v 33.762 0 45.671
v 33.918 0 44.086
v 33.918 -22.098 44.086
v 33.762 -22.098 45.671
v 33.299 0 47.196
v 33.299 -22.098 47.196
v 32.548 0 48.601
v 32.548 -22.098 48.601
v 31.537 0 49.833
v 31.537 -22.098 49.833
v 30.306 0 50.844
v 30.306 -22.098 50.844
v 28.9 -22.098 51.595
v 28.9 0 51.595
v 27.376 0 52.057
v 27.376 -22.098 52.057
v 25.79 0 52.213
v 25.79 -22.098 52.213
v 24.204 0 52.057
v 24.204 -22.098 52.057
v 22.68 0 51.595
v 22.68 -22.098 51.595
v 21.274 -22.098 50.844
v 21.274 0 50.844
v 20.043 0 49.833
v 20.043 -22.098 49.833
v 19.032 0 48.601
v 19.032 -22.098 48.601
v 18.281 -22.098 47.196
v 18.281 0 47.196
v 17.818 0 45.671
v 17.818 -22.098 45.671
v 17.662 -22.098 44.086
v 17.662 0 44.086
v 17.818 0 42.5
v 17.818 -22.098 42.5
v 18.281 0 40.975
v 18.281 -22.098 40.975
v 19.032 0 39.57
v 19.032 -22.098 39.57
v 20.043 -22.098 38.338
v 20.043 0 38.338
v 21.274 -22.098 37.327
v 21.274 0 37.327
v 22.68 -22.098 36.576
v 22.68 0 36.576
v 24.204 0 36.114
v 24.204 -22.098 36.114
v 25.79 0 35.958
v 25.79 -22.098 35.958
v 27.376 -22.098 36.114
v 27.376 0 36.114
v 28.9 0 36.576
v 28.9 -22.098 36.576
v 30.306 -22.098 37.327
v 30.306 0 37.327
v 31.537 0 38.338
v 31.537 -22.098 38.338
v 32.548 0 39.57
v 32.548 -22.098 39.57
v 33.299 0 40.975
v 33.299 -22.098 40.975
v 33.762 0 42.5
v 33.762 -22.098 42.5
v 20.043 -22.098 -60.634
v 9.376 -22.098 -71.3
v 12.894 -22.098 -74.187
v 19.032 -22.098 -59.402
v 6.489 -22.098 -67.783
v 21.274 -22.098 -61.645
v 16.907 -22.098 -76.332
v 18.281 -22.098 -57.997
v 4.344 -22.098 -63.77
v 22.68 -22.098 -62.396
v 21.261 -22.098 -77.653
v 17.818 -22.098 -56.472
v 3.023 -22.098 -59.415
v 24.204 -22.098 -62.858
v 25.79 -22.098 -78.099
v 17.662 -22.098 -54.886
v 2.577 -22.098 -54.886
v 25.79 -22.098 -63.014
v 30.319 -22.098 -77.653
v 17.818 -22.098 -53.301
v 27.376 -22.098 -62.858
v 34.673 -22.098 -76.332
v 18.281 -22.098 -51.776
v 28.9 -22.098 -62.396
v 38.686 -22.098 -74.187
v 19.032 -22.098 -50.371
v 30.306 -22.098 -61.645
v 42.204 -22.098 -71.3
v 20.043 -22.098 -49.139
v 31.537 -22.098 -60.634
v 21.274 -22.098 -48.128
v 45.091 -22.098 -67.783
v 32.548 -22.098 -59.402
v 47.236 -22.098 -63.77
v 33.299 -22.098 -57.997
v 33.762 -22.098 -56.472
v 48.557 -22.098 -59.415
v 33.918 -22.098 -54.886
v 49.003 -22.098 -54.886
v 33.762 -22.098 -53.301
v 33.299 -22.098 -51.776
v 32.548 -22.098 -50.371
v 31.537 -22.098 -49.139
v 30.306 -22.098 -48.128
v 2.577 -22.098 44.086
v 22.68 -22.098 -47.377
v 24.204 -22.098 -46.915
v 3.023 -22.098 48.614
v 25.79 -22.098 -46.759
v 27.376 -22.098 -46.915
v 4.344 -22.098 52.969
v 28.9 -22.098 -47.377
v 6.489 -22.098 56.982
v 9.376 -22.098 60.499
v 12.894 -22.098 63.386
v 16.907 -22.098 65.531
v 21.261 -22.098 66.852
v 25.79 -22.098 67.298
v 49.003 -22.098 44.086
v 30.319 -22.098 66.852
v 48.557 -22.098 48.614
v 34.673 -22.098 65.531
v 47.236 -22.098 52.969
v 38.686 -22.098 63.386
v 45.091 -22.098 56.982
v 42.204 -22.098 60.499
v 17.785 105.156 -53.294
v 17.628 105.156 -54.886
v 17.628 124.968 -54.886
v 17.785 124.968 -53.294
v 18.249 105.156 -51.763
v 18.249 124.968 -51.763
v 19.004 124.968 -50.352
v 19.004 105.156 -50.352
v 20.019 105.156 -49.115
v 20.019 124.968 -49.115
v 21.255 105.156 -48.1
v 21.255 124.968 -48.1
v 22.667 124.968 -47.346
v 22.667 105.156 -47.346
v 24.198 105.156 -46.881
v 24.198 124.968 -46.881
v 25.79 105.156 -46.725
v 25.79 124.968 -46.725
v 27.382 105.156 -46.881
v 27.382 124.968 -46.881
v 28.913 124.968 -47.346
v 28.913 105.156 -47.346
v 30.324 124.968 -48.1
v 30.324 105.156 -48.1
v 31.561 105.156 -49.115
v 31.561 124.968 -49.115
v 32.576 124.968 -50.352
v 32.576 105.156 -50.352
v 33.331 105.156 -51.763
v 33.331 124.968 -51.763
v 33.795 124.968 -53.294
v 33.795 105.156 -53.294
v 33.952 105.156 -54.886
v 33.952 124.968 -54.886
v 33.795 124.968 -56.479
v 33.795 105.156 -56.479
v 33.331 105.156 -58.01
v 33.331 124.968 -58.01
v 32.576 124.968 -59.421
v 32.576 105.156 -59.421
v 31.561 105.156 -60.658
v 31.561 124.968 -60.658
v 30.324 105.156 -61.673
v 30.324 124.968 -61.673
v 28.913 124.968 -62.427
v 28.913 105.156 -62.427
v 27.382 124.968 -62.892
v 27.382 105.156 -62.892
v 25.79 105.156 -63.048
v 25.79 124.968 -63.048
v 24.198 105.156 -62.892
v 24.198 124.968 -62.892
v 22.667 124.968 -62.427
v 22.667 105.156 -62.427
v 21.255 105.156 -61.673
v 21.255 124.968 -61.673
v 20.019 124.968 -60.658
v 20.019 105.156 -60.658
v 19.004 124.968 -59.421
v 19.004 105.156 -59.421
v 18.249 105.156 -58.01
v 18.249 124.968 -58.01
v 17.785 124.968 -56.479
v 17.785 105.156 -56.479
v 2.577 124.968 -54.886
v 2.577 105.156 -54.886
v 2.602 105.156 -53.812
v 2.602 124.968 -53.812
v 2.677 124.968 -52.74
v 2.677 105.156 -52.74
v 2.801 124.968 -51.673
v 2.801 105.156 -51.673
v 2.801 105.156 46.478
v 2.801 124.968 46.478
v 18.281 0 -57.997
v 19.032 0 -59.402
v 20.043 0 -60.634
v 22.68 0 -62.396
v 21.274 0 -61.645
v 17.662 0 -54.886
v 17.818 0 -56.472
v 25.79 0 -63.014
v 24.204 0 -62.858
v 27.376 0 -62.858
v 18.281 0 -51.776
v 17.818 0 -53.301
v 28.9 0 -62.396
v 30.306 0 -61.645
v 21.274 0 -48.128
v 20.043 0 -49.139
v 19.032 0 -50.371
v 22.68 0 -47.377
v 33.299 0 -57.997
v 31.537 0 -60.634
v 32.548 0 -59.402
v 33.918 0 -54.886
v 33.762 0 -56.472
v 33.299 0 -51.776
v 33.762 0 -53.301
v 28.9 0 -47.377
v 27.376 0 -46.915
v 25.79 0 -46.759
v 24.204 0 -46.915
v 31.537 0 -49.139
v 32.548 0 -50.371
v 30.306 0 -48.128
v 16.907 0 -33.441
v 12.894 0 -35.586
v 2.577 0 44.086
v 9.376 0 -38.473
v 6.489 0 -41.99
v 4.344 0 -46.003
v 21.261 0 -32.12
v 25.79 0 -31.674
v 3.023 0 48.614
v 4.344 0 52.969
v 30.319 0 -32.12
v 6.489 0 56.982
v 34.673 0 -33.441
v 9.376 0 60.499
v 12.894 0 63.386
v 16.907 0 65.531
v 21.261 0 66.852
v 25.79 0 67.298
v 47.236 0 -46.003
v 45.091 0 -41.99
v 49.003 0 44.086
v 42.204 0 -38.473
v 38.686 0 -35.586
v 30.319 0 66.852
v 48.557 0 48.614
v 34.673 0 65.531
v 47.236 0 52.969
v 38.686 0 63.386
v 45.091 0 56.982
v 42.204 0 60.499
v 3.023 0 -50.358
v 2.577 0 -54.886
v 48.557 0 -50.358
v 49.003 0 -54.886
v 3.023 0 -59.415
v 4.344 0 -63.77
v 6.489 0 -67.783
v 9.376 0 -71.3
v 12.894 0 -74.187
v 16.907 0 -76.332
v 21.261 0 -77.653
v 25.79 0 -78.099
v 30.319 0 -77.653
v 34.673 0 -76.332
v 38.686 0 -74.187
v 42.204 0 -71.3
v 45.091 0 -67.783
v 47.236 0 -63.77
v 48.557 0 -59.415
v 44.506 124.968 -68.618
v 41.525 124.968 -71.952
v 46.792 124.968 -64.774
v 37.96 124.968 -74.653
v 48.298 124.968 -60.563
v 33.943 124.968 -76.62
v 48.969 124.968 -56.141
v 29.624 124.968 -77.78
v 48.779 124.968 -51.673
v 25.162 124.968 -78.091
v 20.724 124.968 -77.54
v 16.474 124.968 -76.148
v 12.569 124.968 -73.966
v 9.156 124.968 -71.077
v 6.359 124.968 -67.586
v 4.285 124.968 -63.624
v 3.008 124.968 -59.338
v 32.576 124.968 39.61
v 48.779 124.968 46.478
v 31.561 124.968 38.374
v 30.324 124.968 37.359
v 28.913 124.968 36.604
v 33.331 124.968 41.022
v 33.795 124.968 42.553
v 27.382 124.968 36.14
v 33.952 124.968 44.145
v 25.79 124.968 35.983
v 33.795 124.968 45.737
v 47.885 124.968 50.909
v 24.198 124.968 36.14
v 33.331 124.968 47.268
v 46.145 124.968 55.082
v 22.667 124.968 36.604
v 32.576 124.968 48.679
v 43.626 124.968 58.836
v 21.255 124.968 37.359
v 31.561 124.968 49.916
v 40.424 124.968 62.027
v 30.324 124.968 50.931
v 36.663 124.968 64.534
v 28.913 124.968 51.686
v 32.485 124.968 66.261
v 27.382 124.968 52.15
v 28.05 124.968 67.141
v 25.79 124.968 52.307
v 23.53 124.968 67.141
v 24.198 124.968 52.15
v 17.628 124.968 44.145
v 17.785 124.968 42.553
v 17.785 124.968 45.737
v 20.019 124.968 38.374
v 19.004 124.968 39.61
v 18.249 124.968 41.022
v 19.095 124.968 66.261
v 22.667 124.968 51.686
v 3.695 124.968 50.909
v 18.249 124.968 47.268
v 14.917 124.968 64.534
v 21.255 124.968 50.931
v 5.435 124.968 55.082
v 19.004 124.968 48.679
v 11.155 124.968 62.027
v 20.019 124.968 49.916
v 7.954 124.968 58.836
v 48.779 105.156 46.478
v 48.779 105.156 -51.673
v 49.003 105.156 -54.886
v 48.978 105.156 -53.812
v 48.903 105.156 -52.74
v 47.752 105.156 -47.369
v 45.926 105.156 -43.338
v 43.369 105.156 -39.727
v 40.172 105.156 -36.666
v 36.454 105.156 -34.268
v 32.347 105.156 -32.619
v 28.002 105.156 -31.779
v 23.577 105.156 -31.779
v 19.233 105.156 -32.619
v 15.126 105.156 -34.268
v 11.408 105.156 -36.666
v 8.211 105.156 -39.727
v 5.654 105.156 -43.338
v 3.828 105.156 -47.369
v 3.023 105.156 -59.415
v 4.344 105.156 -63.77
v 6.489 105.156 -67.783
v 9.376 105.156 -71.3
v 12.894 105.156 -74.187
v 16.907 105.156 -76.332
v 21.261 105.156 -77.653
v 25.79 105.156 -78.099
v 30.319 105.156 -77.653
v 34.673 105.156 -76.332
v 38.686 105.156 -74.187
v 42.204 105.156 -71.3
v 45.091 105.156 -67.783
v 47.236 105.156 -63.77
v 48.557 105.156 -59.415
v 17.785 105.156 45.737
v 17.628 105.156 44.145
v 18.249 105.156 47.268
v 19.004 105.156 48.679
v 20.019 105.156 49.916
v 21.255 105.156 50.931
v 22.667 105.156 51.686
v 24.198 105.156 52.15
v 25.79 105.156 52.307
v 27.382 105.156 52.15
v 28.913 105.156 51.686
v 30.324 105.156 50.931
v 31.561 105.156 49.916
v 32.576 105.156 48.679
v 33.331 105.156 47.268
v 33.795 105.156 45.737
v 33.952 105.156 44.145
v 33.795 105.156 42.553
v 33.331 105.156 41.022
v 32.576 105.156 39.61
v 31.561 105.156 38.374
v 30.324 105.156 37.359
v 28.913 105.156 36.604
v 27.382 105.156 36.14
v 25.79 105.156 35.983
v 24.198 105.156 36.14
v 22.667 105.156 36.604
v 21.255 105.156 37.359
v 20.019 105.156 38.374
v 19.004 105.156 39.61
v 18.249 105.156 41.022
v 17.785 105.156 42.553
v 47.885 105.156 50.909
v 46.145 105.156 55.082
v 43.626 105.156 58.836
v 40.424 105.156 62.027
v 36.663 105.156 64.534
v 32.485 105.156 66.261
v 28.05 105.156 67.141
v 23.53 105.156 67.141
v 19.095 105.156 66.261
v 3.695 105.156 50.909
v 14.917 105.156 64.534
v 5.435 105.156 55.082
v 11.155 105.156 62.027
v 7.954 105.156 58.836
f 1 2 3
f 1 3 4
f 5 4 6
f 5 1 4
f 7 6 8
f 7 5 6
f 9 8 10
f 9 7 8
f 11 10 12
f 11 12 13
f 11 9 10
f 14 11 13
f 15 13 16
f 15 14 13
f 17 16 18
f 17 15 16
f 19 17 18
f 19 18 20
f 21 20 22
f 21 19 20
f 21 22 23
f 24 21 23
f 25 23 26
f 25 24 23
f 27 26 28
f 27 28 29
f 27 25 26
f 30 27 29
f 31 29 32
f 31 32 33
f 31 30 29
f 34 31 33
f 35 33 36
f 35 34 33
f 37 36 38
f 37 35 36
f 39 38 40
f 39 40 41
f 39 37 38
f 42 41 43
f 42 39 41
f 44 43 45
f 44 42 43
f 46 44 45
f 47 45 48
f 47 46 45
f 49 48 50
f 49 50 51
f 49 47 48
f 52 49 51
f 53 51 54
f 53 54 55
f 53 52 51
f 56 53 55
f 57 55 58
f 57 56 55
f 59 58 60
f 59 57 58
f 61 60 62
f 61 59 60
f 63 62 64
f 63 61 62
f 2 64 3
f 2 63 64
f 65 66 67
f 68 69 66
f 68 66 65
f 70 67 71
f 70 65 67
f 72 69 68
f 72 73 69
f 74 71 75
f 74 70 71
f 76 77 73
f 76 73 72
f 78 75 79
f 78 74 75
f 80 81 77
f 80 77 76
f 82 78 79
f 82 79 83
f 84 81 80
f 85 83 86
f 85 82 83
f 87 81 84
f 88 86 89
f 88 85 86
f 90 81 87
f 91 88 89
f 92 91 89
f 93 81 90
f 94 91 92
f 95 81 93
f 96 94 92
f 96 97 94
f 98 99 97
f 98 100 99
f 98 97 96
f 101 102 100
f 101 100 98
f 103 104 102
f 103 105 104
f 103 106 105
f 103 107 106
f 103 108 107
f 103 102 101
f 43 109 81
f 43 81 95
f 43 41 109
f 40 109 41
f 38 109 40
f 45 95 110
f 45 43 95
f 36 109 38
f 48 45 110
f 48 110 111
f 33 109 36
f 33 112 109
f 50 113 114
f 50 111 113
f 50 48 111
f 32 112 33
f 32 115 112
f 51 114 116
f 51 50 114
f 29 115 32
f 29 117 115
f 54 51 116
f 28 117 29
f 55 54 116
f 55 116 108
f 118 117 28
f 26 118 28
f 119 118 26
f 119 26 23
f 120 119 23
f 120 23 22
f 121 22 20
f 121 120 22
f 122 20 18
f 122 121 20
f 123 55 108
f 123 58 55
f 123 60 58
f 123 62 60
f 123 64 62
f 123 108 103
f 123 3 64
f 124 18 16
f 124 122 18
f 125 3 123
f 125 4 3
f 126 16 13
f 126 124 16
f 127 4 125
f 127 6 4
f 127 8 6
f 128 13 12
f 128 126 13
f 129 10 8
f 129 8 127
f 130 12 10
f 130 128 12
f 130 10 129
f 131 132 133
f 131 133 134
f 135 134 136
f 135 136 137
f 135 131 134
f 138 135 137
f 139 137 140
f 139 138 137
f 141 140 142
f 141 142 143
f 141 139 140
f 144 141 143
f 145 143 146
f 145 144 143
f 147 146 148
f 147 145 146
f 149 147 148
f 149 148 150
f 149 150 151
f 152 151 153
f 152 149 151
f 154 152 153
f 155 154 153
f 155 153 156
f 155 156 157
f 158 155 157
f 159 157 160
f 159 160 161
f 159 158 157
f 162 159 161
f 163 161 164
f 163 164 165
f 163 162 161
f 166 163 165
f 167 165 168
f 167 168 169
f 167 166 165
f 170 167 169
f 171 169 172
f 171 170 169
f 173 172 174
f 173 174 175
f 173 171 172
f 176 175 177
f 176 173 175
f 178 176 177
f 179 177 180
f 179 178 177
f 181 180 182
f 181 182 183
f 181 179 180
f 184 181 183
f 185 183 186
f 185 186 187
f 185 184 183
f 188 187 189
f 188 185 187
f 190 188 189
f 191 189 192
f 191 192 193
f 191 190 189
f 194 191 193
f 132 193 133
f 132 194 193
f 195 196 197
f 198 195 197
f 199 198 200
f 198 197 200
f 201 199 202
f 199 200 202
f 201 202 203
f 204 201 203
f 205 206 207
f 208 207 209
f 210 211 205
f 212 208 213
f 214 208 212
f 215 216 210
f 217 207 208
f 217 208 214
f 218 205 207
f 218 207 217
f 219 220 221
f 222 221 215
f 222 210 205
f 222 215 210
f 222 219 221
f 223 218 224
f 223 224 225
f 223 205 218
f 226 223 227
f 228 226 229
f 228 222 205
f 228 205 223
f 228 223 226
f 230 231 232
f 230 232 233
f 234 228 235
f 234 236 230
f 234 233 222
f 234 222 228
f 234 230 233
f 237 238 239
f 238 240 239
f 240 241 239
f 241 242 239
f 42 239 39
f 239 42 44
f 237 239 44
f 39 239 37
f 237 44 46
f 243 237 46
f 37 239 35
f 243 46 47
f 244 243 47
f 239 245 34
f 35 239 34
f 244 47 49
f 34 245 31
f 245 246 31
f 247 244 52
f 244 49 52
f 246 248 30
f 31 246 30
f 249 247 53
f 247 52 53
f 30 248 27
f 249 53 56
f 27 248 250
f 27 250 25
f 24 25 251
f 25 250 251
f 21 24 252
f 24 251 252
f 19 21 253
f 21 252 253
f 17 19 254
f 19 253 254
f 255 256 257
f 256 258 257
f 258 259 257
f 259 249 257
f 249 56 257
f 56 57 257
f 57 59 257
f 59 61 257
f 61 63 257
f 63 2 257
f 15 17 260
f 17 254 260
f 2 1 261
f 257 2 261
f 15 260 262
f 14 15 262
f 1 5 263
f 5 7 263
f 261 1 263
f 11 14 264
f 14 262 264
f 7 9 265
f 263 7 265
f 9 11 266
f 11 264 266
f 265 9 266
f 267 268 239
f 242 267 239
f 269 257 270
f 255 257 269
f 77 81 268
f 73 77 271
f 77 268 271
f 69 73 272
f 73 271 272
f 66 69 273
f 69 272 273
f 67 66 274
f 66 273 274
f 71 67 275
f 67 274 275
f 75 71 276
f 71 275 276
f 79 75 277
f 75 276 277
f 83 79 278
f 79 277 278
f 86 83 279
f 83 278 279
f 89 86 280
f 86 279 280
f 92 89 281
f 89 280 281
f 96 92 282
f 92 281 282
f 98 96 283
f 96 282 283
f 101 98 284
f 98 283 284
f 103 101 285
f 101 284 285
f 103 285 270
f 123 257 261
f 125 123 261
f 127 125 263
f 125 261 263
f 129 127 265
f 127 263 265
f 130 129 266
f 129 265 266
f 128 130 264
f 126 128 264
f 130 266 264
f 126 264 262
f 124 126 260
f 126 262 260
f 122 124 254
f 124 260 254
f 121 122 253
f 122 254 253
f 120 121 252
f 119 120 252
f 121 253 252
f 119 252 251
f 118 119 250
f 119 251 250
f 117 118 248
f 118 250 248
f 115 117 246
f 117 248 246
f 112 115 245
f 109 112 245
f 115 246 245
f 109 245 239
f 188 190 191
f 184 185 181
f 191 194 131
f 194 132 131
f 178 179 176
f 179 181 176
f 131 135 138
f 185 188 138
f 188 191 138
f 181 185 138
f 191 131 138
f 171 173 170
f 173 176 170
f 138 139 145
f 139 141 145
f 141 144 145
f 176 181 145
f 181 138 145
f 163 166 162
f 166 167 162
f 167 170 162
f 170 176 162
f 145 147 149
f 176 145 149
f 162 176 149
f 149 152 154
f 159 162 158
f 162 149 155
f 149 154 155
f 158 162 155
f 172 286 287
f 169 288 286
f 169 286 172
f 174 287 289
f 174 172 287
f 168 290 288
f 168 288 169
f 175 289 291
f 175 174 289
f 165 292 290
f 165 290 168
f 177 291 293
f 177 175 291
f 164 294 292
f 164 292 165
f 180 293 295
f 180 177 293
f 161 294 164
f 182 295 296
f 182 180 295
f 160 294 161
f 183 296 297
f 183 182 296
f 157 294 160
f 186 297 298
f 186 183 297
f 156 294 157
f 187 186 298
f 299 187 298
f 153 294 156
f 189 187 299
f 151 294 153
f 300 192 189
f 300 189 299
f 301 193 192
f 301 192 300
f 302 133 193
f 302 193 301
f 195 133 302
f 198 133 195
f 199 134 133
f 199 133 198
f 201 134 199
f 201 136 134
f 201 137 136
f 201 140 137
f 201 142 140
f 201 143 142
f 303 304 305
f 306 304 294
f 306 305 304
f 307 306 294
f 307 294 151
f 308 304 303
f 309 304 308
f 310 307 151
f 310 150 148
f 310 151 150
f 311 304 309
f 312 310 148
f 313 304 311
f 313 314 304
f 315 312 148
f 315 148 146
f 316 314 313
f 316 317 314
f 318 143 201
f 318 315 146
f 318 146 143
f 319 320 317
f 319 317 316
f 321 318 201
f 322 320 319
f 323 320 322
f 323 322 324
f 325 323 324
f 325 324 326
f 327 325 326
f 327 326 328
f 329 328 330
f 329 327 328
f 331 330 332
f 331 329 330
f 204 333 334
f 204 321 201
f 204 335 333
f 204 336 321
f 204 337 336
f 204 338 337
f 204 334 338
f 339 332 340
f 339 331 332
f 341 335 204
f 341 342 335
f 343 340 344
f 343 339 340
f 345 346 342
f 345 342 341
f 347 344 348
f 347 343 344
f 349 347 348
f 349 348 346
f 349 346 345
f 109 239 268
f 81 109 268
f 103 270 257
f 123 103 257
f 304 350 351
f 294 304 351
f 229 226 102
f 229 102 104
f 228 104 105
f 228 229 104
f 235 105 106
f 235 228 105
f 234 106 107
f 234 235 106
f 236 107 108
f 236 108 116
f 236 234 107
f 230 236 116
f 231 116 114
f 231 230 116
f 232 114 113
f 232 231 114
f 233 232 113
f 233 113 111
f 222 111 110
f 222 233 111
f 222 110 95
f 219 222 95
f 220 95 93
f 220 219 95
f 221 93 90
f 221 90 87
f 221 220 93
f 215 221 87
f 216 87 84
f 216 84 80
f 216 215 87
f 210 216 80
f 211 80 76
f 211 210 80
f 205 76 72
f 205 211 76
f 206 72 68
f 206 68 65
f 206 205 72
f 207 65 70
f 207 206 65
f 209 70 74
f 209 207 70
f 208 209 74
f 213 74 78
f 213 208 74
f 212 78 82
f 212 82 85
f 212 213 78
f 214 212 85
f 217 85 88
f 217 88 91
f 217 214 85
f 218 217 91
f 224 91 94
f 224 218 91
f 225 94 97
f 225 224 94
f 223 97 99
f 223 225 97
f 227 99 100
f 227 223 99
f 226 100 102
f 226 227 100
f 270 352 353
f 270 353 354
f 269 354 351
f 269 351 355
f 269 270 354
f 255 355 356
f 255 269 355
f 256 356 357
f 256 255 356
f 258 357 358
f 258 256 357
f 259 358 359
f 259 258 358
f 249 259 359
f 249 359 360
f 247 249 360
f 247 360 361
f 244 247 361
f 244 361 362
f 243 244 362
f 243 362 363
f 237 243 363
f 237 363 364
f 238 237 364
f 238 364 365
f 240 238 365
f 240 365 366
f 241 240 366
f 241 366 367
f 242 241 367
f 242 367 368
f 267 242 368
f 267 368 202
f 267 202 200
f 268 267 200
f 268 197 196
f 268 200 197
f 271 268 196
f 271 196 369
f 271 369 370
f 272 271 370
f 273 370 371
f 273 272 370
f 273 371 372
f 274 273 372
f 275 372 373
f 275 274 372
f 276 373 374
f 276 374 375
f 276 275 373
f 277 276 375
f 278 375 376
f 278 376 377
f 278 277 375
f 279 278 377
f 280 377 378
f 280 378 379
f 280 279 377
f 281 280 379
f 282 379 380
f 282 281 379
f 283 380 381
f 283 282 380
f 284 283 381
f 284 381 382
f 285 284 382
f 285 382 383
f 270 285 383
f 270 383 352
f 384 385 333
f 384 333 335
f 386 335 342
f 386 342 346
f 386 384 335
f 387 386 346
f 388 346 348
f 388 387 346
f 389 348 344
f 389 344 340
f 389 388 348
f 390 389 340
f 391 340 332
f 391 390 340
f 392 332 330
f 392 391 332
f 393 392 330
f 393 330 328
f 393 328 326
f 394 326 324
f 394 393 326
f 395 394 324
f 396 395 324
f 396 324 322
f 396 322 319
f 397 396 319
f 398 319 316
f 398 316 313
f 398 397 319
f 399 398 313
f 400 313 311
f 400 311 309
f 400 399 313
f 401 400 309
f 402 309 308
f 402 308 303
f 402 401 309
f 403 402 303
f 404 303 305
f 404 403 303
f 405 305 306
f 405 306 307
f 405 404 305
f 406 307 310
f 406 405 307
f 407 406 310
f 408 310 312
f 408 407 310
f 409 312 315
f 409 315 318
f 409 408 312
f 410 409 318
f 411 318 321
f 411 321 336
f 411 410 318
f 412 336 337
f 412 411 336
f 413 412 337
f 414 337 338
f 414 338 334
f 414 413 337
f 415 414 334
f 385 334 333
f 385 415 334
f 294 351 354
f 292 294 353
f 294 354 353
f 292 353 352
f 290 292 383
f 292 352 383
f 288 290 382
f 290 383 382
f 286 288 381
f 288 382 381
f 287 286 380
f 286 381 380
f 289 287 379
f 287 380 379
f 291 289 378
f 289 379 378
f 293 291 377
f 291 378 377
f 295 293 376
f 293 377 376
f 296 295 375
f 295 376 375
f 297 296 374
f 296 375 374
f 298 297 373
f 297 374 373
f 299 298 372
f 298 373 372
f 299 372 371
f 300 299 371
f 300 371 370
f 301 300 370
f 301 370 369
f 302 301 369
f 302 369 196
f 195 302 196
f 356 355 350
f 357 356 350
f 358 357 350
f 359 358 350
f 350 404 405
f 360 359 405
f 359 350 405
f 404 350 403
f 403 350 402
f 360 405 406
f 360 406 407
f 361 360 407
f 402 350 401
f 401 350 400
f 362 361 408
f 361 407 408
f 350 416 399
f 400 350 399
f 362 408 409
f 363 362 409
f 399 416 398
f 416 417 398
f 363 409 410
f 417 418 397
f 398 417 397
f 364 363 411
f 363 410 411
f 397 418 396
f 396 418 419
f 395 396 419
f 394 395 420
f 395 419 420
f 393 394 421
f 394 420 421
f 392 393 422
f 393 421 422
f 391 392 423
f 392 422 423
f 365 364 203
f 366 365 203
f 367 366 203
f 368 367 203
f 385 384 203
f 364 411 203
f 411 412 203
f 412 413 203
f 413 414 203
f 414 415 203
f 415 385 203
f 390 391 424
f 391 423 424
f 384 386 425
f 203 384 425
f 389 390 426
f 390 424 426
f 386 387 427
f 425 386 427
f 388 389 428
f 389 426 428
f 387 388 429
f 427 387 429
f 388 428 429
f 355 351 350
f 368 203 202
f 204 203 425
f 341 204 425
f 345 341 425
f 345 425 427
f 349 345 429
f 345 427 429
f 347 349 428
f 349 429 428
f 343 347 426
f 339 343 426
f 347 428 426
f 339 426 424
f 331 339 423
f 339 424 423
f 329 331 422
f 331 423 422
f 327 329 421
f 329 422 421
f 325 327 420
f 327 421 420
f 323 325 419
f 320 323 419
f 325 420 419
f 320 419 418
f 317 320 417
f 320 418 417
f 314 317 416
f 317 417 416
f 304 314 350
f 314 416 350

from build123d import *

# Parameters (mm, degrees)
F0_R     = 23.2127489618
F1_DEPTH = 105.156
F2_R     = 8.1279313569
F3_DEPTH = 22.098
F4_R     = 8.1619087152
F5_DEPTH = 19.812


with BuildPart() as f1:
    # F0 (on Front) → F1 (new body)
    with BuildSketch(Plane.XZ):
        with Locations((25.789950043, -54.8864603043)):
            Circle(F0_R)
    extrude(amount=-F1_DEPTH)

    # F2 (on face) → F3 (join)
    with BuildSketch(Plane.XZ):
        with BuildLine():
            Line((2.5772010811, 44.0855585039), (2.5772010811, -54.8864603043))
            ThreePointArc((2.5772010811, -54.8864603043), (25.789950043, -31.6737113424), (49.0026990048, -54.8864603043))
            Line((49.0026990048, -54.8864603043), (49.0026990048, 44.0855585039))
            ThreePointArc((49.0026990048, 44.0855585039), (25.789950043, 67.2983074657), (2.5772010811, 44.0855585039))
        make_face()
        with Locations((25.789950043, 44.0855585039)):
            Circle(F2_R, mode=Mode.SUBTRACT)
        with BuildLine():
            ThreePointArc((49.0026990048, -54.8864603043), (25.789950043, -31.6737113424), (2.5772010811, -54.8864603043))
            ThreePointArc((2.5772010811, -54.8864603043), (25.789950043, -78.0992092661), (49.0026990048, -54.8864603043))
        make_face()
        with Locations((25.789950043, -54.8864603043)):
            Circle(F2_R, mode=Mode.SUBTRACT)
    extrude(amount=F3_DEPTH)

    # F4 (on face) → F5 (join)
    with BuildSketch(Plane(origin=(0, 105.156, 0), x_dir=(-1, 0, 0), z_dir=(0, 1, 0))):
        with BuildLine():
            Line((-48.7791649624, 46.4776218361), (-48.7791649624, -51.6727845653))
            ThreePointArc((-48.7791649624, -51.6727845653), (-25.789950043, -31.6737113424), (-2.8007351236, -51.6727845653))
            Line((-2.8007351236, -51.6727845653), (-2.8007351236, 46.4776218361))
            ThreePointArc((-2.8007351236, 46.4776218361), (-25.789950043, 67.2522081192), (-48.7791649624, 46.4776218361))
        make_face()
        with Locations((-25.789950043, 44.144950416)):
            Circle(F4_R, mode=Mode.SUBTRACT)
        with BuildLine():
            ThreePointArc((-2.8007351236, -51.6727845653), (-25.789950043, -31.6737113424), (-48.7791649624, -51.6727845653))
            ThreePointArc((-48.7791649624, -51.6727845653), (-27.4006703184, -78.0432583247), (-2.5772010811, -54.8864603043))
            ThreePointArc((-2.5772010811, -54.8864603043), (-2.6331520225, -53.2757400288), (-2.8007351236, -51.6727845653))
        make_face()
        with Locations((-25.789950043, -54.8864603043)):
            Circle(F4_R, mode=Mode.SUBTRACT)
    extrude(amount=F5_DEPTH)


solid = f1.part
